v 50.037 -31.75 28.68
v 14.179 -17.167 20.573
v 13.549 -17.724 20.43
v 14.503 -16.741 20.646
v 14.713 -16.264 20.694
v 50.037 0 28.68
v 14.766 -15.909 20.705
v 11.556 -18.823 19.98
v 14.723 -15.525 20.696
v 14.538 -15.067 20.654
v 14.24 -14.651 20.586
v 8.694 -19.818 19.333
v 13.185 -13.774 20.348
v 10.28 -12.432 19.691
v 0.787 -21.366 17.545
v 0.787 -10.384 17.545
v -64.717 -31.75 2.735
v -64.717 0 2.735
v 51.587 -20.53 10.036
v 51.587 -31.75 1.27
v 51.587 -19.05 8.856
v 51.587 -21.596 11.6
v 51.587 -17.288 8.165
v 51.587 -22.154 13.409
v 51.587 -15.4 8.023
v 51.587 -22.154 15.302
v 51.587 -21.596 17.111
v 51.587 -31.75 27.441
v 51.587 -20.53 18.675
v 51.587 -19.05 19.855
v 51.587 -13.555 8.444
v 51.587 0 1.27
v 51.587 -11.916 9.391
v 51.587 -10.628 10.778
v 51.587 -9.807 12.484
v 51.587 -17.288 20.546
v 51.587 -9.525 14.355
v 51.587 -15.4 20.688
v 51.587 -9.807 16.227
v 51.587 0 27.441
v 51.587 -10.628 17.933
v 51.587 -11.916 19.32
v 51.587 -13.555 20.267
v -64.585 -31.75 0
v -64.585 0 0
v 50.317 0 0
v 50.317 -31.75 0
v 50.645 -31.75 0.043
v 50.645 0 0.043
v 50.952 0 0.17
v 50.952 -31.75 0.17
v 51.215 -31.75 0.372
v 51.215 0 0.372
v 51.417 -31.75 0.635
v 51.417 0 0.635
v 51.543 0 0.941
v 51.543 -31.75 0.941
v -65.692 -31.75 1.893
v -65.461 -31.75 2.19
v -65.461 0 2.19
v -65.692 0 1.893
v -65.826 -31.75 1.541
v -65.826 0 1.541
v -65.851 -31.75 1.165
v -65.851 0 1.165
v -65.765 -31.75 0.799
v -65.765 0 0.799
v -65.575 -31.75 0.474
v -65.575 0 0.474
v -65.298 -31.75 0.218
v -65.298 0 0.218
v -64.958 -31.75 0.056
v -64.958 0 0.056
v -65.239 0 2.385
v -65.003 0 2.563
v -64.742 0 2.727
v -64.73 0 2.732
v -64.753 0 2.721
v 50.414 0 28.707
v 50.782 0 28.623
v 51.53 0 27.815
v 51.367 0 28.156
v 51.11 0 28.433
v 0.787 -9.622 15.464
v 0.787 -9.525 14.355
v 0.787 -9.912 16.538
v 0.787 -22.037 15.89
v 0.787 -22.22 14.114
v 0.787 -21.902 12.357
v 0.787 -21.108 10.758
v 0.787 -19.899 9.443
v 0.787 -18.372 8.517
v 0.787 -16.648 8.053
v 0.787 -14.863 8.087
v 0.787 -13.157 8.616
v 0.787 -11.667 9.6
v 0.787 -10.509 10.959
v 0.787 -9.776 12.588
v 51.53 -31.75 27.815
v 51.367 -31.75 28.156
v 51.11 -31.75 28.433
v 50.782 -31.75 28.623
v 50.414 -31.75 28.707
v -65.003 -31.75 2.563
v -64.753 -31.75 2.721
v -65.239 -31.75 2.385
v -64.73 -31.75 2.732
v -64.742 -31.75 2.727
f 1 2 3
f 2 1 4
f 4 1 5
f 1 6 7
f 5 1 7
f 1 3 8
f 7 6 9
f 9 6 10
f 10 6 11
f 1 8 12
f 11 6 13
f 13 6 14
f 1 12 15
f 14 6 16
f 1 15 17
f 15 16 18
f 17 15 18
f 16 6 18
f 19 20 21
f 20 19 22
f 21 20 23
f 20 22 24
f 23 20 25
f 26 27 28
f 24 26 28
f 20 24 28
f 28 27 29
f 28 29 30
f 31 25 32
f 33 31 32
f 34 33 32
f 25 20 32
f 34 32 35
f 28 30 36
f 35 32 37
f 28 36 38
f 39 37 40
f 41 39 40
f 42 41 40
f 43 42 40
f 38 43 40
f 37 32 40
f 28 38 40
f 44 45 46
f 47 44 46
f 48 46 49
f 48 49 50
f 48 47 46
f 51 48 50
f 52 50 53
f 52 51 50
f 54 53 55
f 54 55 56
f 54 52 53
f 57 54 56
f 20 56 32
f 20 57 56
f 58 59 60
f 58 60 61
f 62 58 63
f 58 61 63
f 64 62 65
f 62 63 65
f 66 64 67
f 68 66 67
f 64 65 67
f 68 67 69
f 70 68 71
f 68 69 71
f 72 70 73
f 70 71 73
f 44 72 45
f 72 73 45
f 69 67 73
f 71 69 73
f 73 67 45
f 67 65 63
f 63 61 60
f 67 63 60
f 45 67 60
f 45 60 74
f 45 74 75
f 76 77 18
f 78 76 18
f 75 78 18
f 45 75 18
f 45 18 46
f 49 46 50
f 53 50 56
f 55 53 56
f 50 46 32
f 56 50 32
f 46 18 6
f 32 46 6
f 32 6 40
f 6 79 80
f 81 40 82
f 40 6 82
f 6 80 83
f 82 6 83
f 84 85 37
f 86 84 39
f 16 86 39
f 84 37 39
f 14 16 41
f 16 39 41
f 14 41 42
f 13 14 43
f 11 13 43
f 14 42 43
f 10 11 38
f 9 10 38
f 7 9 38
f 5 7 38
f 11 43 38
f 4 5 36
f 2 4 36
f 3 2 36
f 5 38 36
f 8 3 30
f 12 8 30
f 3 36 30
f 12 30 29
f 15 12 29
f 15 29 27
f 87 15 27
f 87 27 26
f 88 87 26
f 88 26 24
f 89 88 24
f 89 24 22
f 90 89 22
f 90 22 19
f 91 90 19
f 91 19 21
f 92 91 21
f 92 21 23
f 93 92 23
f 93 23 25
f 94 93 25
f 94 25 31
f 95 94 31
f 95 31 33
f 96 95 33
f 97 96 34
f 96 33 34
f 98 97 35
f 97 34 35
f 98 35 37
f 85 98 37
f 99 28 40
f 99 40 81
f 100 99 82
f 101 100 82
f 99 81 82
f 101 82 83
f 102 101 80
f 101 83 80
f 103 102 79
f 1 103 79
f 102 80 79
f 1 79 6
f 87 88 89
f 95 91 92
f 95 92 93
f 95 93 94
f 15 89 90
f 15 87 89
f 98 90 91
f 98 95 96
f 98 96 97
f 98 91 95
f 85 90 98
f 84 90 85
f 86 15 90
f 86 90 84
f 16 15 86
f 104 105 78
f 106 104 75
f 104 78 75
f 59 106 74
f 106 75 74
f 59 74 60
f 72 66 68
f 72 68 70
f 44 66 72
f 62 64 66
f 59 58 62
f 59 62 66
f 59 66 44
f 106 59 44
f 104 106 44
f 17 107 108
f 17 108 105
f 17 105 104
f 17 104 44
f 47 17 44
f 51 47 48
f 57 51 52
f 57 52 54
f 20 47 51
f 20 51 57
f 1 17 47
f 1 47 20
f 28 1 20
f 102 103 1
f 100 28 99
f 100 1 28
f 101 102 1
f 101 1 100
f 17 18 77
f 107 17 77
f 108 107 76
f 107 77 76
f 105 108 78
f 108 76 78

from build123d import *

# Parameters (mm, degrees)
F1_DEPTH = 31.75
F2_R     = 1.27
F3_R     = 6.35
F4_DEPTH = 50.8


with BuildPart() as f1:
    # F0 (on Front) → F1 (new body)
    with BuildSketch(Plane.XZ):
        with BuildLine():
            ThreePointArc((-65.460752, 2.190165), (-65.764729, 0.798677), (-64.585426, 0))
            Line((-64.585426, 0), (51.586725, 0))
            Line((51.586725, 0), (51.586725, 27.440994))
            ThreePointArc((51.586725, 27.440994), (51.109575, 28.433107), (50.036663, 28.679729))
            Line((50.036663, 28.679729), (-64.717408, 2.73533))
            ThreePointArc((-64.717408, 2.73533), (-64.735903, 2.729636), (-64.753319, 2.721199))
            ThreePointArc((-64.753319, 2.721199), (-65.122522, 2.476312), (-65.460752, 2.190165))
        make_face()
    extrude(amount=F1_DEPTH)

    # F2
    f2_edges = [f1.edges().sort_by_distance(p)[0] for p in [
        (51.586725, -15.875, 0),
    ]]
    fillet(f2_edges, radius=F2_R)

    # F3 (on face) → F4 (cut)
    with BuildSketch(Plane.YZ.offset(51.586725)):
        with Locations((-15.875, 14.355497)):
            Circle(F3_R)
    extrude(amount=-F4_DEPTH, mode=Mode.SUBTRACT)


solid = f1.part
